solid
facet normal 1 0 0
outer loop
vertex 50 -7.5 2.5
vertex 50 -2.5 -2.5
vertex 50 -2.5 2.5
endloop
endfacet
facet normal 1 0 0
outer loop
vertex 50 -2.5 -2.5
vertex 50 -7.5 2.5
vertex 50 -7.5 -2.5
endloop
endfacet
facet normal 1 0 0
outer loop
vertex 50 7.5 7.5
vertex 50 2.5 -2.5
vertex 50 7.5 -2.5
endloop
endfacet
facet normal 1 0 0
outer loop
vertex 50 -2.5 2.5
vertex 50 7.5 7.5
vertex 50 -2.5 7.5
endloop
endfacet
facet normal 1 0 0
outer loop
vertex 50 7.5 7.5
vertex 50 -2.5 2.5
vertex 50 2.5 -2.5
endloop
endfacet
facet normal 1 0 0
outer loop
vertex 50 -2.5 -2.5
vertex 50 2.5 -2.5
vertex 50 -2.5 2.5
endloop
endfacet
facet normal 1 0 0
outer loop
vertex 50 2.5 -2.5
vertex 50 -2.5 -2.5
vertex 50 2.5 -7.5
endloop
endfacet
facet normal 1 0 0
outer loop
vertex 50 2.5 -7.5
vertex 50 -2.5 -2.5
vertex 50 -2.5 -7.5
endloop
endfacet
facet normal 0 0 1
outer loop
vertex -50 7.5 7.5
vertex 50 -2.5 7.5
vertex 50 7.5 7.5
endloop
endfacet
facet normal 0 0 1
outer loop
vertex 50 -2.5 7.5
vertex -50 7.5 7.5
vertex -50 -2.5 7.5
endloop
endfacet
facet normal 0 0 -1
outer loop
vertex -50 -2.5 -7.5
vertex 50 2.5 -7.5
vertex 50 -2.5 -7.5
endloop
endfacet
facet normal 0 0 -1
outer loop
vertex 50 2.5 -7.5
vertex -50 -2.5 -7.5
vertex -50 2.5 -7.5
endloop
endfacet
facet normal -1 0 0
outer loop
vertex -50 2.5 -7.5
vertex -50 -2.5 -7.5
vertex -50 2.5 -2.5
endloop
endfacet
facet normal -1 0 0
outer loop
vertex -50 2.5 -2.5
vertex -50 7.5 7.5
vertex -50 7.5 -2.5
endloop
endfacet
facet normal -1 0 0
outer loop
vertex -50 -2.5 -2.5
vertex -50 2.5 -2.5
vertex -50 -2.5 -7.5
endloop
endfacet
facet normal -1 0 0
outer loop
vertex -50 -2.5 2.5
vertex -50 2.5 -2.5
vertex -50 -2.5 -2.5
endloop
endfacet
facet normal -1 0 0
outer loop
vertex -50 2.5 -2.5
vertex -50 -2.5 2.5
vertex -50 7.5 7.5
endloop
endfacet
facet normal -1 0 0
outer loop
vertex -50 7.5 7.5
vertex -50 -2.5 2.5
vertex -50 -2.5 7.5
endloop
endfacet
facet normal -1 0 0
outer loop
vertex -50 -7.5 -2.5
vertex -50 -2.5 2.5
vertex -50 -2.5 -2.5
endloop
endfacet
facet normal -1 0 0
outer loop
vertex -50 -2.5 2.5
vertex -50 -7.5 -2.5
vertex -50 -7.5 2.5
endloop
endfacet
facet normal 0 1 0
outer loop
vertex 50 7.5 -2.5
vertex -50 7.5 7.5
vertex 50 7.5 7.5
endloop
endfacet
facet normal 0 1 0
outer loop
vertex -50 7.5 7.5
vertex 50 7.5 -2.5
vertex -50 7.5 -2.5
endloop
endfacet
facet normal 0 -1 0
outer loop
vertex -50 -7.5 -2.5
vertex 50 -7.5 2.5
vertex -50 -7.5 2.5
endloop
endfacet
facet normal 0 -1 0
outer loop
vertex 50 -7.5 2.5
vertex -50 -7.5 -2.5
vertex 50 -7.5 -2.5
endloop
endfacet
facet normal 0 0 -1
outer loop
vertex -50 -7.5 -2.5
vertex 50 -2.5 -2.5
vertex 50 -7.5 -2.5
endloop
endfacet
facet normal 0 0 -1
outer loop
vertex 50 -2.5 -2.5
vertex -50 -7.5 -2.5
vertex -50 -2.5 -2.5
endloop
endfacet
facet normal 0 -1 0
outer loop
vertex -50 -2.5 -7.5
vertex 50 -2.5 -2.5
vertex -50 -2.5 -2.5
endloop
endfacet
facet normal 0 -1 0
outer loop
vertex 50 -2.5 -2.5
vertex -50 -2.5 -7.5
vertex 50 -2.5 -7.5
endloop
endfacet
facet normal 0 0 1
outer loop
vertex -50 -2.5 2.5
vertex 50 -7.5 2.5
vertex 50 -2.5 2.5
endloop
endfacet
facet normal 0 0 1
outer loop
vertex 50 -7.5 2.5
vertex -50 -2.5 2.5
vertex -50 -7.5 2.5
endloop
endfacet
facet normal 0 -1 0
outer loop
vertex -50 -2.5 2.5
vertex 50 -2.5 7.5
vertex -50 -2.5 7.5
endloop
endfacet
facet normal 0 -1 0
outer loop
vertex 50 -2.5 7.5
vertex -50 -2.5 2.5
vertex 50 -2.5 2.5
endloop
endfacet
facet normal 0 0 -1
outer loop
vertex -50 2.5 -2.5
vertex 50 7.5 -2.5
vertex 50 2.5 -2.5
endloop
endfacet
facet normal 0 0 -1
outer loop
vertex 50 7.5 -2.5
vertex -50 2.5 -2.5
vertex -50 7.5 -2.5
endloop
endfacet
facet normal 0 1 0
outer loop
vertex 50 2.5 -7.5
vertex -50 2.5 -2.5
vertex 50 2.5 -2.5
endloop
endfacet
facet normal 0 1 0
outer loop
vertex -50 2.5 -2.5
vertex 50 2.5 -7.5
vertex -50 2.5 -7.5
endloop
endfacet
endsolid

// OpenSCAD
module linear_guide_rail() {
    difference() {
        // Main body of the rail
        cube([100, 15, 15], center = true);
        
        // Cut out the rail groove
        translate([-50, -7.5, -7.5])
            cube([100, 5, 5], center = false);
        
        // Cut out the side grooves
        translate([-50, -7.5, 2.5])
            cube([100, 5, 5], center = false);
        
        translate([-50, 2.5, -7.5])
            cube([100, 5, 5], center = false);
    }
}

linear_guide_rail();
